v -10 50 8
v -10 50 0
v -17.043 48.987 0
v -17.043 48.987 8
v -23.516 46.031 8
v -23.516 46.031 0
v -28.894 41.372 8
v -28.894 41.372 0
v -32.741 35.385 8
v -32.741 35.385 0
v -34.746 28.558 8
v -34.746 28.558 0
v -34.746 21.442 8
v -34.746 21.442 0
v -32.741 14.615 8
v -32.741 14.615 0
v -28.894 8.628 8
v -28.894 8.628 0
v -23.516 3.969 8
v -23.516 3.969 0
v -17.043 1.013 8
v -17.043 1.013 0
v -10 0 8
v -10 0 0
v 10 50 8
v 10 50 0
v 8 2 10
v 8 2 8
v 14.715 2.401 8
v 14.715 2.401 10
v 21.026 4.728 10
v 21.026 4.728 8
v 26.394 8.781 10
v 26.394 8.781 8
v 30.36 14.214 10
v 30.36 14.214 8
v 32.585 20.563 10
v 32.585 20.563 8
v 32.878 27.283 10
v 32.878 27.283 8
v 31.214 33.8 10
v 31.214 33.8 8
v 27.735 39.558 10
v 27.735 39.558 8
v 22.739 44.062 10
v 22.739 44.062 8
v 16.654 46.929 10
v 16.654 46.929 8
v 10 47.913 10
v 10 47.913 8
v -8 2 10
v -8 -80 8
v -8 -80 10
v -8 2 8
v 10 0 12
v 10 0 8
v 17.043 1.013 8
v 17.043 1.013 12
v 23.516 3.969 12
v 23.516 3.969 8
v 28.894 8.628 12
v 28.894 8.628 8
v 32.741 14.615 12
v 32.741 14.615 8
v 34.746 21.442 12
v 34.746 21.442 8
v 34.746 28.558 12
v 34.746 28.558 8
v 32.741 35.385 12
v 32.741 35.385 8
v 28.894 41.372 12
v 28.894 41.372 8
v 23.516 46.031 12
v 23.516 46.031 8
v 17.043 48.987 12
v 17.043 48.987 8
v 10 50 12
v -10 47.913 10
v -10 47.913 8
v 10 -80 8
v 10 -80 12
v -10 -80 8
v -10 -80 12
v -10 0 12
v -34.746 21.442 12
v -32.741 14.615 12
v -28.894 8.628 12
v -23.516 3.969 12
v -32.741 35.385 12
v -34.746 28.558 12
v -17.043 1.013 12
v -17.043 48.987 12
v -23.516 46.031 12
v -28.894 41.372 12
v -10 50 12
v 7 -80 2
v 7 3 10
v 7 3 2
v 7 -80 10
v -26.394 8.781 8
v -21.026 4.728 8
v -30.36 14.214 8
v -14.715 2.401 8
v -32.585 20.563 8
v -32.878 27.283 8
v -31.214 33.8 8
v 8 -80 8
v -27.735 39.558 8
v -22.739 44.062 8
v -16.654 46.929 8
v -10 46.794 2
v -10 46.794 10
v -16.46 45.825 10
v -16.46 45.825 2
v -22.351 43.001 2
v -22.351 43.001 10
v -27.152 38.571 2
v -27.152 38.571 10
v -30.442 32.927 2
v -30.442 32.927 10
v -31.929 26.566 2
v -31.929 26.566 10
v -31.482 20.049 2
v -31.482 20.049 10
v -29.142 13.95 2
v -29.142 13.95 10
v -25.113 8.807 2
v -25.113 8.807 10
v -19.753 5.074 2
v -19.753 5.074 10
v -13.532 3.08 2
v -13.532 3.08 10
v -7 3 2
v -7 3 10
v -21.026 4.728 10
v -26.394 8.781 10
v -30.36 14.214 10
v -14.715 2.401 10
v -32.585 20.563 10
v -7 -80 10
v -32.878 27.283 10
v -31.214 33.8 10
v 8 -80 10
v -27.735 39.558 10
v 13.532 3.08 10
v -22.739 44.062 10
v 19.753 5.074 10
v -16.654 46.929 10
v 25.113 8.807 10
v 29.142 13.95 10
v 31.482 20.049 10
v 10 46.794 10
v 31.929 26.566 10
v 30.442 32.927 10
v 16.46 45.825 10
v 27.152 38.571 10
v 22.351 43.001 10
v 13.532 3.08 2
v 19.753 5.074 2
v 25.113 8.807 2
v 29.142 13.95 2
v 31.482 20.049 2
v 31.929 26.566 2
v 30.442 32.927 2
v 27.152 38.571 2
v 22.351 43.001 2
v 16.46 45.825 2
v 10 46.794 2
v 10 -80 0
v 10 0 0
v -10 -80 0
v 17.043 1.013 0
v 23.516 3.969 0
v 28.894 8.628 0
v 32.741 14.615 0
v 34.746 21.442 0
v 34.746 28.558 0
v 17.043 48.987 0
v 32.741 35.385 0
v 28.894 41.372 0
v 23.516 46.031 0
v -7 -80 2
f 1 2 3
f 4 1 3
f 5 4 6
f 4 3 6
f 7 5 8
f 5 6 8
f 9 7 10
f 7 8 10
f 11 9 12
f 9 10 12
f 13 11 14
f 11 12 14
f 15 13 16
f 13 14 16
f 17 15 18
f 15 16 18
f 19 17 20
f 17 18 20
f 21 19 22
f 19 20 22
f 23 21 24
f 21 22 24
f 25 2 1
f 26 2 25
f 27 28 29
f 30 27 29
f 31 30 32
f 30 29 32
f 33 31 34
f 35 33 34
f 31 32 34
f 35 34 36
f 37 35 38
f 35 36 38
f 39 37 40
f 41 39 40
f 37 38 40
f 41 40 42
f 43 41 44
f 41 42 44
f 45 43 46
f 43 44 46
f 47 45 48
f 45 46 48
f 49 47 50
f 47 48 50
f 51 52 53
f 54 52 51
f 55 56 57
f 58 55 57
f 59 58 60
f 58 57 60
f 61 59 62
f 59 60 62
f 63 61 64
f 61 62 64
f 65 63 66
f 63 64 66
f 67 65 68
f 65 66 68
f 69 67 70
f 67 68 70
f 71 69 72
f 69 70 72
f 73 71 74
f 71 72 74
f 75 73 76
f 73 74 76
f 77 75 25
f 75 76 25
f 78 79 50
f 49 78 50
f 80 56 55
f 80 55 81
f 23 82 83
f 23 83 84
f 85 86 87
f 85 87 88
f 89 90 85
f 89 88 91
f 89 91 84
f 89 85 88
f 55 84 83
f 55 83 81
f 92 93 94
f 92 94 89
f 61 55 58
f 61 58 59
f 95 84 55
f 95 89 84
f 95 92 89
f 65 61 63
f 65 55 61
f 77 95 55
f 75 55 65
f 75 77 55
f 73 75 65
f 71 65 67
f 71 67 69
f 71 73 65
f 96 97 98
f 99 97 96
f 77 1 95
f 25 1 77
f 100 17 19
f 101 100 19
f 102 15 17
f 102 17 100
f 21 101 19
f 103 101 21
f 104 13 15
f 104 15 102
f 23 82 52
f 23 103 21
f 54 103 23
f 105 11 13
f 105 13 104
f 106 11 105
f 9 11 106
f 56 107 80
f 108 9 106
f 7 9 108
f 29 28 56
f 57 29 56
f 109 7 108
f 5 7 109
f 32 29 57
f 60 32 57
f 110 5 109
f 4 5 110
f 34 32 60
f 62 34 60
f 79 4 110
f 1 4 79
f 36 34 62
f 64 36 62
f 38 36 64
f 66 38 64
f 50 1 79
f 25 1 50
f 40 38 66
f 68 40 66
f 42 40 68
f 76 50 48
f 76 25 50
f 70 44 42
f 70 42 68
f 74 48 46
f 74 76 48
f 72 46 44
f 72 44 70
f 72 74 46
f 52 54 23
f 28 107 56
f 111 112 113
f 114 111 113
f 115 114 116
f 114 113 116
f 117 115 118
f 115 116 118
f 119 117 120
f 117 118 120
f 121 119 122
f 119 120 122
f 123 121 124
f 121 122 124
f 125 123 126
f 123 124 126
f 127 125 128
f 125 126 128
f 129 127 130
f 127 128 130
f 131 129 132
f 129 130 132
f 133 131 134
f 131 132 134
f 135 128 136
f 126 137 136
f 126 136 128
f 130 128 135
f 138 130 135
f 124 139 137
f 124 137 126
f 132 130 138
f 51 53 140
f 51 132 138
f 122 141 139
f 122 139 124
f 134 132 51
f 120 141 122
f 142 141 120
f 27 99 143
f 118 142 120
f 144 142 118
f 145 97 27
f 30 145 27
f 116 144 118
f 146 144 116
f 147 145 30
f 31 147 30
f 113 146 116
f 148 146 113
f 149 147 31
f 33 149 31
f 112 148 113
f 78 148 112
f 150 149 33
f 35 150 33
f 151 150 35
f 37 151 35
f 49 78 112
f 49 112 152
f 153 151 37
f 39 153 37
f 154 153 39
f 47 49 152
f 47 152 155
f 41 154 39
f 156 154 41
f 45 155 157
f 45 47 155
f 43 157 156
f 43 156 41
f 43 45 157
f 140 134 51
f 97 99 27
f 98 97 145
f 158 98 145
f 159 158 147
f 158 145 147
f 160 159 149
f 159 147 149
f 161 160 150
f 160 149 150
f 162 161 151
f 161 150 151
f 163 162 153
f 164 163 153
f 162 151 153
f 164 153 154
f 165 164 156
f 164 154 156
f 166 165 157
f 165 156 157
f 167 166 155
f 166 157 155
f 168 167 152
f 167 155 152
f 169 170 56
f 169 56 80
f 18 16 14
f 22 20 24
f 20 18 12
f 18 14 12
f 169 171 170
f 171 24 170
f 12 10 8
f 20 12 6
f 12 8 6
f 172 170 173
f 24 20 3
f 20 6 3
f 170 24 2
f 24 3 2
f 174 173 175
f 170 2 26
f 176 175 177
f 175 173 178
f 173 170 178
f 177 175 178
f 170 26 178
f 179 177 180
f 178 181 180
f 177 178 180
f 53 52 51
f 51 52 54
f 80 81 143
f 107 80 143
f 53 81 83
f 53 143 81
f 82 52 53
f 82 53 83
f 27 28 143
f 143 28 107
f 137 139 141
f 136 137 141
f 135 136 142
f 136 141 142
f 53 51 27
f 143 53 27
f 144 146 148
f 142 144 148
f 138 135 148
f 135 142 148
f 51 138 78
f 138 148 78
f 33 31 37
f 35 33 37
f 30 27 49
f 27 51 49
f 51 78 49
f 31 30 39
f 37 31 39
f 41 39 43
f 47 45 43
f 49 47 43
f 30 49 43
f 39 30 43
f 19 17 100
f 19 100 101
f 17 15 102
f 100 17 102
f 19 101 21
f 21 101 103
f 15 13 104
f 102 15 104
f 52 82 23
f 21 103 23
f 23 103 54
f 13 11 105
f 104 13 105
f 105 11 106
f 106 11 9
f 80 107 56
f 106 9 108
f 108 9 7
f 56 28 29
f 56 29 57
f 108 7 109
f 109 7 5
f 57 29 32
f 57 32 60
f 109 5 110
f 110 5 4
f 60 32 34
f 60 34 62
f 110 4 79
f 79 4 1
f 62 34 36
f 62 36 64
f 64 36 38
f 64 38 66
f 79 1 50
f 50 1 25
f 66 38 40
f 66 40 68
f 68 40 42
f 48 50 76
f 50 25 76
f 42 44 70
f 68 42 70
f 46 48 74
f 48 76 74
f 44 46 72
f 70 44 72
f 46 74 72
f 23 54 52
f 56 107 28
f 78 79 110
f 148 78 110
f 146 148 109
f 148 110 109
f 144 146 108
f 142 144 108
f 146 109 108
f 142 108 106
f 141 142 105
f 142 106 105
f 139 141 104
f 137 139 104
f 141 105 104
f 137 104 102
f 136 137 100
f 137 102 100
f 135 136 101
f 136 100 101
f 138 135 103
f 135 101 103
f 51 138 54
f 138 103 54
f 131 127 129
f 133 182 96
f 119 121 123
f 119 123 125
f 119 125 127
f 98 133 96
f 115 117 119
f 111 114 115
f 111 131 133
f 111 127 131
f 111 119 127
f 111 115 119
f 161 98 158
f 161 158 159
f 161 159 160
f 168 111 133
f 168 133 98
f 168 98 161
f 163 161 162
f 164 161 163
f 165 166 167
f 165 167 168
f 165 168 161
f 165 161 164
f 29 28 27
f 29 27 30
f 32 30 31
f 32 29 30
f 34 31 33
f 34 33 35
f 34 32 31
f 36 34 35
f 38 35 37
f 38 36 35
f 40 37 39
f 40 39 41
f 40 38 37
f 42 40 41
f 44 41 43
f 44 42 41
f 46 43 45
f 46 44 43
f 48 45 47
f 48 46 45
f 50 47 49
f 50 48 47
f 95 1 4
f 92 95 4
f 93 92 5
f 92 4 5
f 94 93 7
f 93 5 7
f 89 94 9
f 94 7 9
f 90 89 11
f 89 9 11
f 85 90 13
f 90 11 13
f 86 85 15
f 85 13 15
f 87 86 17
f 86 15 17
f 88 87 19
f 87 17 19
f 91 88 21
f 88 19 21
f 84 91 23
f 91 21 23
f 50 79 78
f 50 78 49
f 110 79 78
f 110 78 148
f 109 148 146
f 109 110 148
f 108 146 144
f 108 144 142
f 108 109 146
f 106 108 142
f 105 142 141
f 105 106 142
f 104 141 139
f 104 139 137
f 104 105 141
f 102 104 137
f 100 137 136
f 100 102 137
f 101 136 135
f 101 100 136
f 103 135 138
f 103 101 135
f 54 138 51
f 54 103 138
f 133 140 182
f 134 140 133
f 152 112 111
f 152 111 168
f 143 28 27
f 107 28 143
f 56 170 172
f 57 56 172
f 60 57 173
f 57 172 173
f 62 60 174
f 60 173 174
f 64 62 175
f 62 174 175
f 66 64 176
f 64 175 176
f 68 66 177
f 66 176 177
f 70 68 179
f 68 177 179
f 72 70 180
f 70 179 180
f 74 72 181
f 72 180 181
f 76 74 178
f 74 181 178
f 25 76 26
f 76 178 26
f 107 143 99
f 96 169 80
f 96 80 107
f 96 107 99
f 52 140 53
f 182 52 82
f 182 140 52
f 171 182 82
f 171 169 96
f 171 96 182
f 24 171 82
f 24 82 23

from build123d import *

# Parameters (mm, degrees)
PAD_DEPTH       = 8
PAD001_DEPTH    = 10
POCKET_DEPTH    = 8
PAD002_DEPTH    = 4
POCKET001_DEPTH = 2
PAD003_DEPTH    = 8
PAD004_DEPTH    = 10
POCKET002_DEPTH = 8


with BuildPart() as body_groove:
    # Sketch → Pad (new body)
    with BuildSketch(Plane.XY):
        with BuildLine():
            ThreePointArc((-10, 50), (-35, 25), (-10, 0))
            Line((-10, -80), (-10, 0))
            Line((10, -80), (-10, -80))
            Line((10, 0), (10, -80))
            ThreePointArc((10, 0), (35, 25), (10, 50))
            Line((-10, 50), (10, 50))
        make_face()
    extrude(amount=PAD_DEPTH)

    # Sketch001 → Pad001 (join)
    with BuildSketch(Plane.XY):
        with BuildLine():
            ThreePointArc((-10, 47.912878), (-32.978209, 23.91193), (-8, 2))
            Line((-8, -80), (-8, 2))
            Line((8, -80), (-8, -80))
            Line((8, 2), (8, -80))
            ThreePointArc((8, 2), (32.978209, 23.91193), (10, 47.912878))
            Line((-10, 47.912878), (10, 47.912878))
        make_face()
    extrude(amount=PAD001_DEPTH)

    # Sketch002 → Pocket (cut)
    with BuildSketch(Plane.XY.offset(10)):
        with BuildLine():
            ThreePointArc((-10, 46.794495), (-31.948564, 23.290979), (-7, 3))
            Line((-7, -80), (-7, 3))
            Line((7, -80), (-7, -80))
            Line((7, 3), (7, -80))
            ThreePointArc((7, 3), (31.948564, 23.290979), (10, 46.794495))
            Line((-10, 46.794495), (10, 46.794495))
        make_face()
    extrude(amount=-POCKET_DEPTH, mode=Mode.SUBTRACT)


with BuildPart() as cover:
    # Sketch003 → Pad002 (new body)
    with BuildSketch(Plane.XY.offset(8)):
        with BuildLine():
            ThreePointArc((-10, 50), (-35, 25), (-10, 0))
            Line((-10, -80), (-10, 0))
            Line((10, -80), (-10, -80))
            Line((10, 0), (10, -80))
            ThreePointArc((10, 0), (35, 25), (10, 50))
            Line((-10, 50), (10, 50))
        make_face()
    extrude(amount=PAD002_DEPTH)

    # Sketch004 → Pocket001 (cut)
    with BuildSketch(Plane.XY.offset(8)):
        with BuildLine():
            ThreePointArc((-10, 46.794495), (-31.948564, 23.290979), (-7, 3))
            Line((-7, -80), (-7, 3))
            Line((7, -80), (-7, -80))
            Line((7, 3), (7, -80))
            ThreePointArc((7, 3), (31.948564, 23.290979), (10, 46.794495))
            Line((-10, 46.794495), (10, 46.794495))
        make_face()
    extrude(amount=POCKET001_DEPTH, mode=Mode.SUBTRACT)

    # Cut: cut Body_groove
    add(body_groove.part, mode=Mode.SUBTRACT)


with BuildPart() as body:
    # Sketch005 → Pad003 (new body)
    with BuildSketch(Plane.XY):
        with BuildLine():
            ThreePointArc((-10, 50), (-35, 25), (-10, 0))
            Line((-10, -80), (-10, 0))
            Line((10, -80), (-10, -80))
            Line((10, 0), (10, -80))
            ThreePointArc((10, 0), (35, 25), (10, 50))
            Line((-10, 50), (10, 50))
        make_face()
    extrude(amount=PAD003_DEPTH)

    # Sketch007 → Pad004 (join)
    with BuildSketch(Plane.XY):
        with BuildLine():
            ThreePointArc((-10, 47.912878), (-32.978209, 23.91193), (-8, 2))
            Line((-8, -80), (-8, 2))
            Line((8, -80), (-8, -80))
            Line((8, 2), (8, -80))
            ThreePointArc((8, 2), (32.978209, 23.91193), (10, 47.912878))
            Line((-10, 47.912878), (10, 47.912878))
        make_face()
    extrude(amount=PAD004_DEPTH)

    # Sketch006 → Pocket002 (cut)
    with BuildSketch(Plane.XY.offset(10)):
        with BuildLine():
            ThreePointArc((-10, 46.794495), (-31.948564, 23.290979), (-7, 3))
            Line((-7, -80), (-7, 3))
            Line((7, -80), (-7, -80))
            Line((7, 3), (7, -80))
            ThreePointArc((7, 3), (31.948564, 23.290979), (10, 46.794495))
            Line((-10, 46.794495), (10, 46.794495))
        make_face()
    extrude(amount=-POCKET002_DEPTH, mode=Mode.SUBTRACT)


solid = Compound([cover.part, body.part])
